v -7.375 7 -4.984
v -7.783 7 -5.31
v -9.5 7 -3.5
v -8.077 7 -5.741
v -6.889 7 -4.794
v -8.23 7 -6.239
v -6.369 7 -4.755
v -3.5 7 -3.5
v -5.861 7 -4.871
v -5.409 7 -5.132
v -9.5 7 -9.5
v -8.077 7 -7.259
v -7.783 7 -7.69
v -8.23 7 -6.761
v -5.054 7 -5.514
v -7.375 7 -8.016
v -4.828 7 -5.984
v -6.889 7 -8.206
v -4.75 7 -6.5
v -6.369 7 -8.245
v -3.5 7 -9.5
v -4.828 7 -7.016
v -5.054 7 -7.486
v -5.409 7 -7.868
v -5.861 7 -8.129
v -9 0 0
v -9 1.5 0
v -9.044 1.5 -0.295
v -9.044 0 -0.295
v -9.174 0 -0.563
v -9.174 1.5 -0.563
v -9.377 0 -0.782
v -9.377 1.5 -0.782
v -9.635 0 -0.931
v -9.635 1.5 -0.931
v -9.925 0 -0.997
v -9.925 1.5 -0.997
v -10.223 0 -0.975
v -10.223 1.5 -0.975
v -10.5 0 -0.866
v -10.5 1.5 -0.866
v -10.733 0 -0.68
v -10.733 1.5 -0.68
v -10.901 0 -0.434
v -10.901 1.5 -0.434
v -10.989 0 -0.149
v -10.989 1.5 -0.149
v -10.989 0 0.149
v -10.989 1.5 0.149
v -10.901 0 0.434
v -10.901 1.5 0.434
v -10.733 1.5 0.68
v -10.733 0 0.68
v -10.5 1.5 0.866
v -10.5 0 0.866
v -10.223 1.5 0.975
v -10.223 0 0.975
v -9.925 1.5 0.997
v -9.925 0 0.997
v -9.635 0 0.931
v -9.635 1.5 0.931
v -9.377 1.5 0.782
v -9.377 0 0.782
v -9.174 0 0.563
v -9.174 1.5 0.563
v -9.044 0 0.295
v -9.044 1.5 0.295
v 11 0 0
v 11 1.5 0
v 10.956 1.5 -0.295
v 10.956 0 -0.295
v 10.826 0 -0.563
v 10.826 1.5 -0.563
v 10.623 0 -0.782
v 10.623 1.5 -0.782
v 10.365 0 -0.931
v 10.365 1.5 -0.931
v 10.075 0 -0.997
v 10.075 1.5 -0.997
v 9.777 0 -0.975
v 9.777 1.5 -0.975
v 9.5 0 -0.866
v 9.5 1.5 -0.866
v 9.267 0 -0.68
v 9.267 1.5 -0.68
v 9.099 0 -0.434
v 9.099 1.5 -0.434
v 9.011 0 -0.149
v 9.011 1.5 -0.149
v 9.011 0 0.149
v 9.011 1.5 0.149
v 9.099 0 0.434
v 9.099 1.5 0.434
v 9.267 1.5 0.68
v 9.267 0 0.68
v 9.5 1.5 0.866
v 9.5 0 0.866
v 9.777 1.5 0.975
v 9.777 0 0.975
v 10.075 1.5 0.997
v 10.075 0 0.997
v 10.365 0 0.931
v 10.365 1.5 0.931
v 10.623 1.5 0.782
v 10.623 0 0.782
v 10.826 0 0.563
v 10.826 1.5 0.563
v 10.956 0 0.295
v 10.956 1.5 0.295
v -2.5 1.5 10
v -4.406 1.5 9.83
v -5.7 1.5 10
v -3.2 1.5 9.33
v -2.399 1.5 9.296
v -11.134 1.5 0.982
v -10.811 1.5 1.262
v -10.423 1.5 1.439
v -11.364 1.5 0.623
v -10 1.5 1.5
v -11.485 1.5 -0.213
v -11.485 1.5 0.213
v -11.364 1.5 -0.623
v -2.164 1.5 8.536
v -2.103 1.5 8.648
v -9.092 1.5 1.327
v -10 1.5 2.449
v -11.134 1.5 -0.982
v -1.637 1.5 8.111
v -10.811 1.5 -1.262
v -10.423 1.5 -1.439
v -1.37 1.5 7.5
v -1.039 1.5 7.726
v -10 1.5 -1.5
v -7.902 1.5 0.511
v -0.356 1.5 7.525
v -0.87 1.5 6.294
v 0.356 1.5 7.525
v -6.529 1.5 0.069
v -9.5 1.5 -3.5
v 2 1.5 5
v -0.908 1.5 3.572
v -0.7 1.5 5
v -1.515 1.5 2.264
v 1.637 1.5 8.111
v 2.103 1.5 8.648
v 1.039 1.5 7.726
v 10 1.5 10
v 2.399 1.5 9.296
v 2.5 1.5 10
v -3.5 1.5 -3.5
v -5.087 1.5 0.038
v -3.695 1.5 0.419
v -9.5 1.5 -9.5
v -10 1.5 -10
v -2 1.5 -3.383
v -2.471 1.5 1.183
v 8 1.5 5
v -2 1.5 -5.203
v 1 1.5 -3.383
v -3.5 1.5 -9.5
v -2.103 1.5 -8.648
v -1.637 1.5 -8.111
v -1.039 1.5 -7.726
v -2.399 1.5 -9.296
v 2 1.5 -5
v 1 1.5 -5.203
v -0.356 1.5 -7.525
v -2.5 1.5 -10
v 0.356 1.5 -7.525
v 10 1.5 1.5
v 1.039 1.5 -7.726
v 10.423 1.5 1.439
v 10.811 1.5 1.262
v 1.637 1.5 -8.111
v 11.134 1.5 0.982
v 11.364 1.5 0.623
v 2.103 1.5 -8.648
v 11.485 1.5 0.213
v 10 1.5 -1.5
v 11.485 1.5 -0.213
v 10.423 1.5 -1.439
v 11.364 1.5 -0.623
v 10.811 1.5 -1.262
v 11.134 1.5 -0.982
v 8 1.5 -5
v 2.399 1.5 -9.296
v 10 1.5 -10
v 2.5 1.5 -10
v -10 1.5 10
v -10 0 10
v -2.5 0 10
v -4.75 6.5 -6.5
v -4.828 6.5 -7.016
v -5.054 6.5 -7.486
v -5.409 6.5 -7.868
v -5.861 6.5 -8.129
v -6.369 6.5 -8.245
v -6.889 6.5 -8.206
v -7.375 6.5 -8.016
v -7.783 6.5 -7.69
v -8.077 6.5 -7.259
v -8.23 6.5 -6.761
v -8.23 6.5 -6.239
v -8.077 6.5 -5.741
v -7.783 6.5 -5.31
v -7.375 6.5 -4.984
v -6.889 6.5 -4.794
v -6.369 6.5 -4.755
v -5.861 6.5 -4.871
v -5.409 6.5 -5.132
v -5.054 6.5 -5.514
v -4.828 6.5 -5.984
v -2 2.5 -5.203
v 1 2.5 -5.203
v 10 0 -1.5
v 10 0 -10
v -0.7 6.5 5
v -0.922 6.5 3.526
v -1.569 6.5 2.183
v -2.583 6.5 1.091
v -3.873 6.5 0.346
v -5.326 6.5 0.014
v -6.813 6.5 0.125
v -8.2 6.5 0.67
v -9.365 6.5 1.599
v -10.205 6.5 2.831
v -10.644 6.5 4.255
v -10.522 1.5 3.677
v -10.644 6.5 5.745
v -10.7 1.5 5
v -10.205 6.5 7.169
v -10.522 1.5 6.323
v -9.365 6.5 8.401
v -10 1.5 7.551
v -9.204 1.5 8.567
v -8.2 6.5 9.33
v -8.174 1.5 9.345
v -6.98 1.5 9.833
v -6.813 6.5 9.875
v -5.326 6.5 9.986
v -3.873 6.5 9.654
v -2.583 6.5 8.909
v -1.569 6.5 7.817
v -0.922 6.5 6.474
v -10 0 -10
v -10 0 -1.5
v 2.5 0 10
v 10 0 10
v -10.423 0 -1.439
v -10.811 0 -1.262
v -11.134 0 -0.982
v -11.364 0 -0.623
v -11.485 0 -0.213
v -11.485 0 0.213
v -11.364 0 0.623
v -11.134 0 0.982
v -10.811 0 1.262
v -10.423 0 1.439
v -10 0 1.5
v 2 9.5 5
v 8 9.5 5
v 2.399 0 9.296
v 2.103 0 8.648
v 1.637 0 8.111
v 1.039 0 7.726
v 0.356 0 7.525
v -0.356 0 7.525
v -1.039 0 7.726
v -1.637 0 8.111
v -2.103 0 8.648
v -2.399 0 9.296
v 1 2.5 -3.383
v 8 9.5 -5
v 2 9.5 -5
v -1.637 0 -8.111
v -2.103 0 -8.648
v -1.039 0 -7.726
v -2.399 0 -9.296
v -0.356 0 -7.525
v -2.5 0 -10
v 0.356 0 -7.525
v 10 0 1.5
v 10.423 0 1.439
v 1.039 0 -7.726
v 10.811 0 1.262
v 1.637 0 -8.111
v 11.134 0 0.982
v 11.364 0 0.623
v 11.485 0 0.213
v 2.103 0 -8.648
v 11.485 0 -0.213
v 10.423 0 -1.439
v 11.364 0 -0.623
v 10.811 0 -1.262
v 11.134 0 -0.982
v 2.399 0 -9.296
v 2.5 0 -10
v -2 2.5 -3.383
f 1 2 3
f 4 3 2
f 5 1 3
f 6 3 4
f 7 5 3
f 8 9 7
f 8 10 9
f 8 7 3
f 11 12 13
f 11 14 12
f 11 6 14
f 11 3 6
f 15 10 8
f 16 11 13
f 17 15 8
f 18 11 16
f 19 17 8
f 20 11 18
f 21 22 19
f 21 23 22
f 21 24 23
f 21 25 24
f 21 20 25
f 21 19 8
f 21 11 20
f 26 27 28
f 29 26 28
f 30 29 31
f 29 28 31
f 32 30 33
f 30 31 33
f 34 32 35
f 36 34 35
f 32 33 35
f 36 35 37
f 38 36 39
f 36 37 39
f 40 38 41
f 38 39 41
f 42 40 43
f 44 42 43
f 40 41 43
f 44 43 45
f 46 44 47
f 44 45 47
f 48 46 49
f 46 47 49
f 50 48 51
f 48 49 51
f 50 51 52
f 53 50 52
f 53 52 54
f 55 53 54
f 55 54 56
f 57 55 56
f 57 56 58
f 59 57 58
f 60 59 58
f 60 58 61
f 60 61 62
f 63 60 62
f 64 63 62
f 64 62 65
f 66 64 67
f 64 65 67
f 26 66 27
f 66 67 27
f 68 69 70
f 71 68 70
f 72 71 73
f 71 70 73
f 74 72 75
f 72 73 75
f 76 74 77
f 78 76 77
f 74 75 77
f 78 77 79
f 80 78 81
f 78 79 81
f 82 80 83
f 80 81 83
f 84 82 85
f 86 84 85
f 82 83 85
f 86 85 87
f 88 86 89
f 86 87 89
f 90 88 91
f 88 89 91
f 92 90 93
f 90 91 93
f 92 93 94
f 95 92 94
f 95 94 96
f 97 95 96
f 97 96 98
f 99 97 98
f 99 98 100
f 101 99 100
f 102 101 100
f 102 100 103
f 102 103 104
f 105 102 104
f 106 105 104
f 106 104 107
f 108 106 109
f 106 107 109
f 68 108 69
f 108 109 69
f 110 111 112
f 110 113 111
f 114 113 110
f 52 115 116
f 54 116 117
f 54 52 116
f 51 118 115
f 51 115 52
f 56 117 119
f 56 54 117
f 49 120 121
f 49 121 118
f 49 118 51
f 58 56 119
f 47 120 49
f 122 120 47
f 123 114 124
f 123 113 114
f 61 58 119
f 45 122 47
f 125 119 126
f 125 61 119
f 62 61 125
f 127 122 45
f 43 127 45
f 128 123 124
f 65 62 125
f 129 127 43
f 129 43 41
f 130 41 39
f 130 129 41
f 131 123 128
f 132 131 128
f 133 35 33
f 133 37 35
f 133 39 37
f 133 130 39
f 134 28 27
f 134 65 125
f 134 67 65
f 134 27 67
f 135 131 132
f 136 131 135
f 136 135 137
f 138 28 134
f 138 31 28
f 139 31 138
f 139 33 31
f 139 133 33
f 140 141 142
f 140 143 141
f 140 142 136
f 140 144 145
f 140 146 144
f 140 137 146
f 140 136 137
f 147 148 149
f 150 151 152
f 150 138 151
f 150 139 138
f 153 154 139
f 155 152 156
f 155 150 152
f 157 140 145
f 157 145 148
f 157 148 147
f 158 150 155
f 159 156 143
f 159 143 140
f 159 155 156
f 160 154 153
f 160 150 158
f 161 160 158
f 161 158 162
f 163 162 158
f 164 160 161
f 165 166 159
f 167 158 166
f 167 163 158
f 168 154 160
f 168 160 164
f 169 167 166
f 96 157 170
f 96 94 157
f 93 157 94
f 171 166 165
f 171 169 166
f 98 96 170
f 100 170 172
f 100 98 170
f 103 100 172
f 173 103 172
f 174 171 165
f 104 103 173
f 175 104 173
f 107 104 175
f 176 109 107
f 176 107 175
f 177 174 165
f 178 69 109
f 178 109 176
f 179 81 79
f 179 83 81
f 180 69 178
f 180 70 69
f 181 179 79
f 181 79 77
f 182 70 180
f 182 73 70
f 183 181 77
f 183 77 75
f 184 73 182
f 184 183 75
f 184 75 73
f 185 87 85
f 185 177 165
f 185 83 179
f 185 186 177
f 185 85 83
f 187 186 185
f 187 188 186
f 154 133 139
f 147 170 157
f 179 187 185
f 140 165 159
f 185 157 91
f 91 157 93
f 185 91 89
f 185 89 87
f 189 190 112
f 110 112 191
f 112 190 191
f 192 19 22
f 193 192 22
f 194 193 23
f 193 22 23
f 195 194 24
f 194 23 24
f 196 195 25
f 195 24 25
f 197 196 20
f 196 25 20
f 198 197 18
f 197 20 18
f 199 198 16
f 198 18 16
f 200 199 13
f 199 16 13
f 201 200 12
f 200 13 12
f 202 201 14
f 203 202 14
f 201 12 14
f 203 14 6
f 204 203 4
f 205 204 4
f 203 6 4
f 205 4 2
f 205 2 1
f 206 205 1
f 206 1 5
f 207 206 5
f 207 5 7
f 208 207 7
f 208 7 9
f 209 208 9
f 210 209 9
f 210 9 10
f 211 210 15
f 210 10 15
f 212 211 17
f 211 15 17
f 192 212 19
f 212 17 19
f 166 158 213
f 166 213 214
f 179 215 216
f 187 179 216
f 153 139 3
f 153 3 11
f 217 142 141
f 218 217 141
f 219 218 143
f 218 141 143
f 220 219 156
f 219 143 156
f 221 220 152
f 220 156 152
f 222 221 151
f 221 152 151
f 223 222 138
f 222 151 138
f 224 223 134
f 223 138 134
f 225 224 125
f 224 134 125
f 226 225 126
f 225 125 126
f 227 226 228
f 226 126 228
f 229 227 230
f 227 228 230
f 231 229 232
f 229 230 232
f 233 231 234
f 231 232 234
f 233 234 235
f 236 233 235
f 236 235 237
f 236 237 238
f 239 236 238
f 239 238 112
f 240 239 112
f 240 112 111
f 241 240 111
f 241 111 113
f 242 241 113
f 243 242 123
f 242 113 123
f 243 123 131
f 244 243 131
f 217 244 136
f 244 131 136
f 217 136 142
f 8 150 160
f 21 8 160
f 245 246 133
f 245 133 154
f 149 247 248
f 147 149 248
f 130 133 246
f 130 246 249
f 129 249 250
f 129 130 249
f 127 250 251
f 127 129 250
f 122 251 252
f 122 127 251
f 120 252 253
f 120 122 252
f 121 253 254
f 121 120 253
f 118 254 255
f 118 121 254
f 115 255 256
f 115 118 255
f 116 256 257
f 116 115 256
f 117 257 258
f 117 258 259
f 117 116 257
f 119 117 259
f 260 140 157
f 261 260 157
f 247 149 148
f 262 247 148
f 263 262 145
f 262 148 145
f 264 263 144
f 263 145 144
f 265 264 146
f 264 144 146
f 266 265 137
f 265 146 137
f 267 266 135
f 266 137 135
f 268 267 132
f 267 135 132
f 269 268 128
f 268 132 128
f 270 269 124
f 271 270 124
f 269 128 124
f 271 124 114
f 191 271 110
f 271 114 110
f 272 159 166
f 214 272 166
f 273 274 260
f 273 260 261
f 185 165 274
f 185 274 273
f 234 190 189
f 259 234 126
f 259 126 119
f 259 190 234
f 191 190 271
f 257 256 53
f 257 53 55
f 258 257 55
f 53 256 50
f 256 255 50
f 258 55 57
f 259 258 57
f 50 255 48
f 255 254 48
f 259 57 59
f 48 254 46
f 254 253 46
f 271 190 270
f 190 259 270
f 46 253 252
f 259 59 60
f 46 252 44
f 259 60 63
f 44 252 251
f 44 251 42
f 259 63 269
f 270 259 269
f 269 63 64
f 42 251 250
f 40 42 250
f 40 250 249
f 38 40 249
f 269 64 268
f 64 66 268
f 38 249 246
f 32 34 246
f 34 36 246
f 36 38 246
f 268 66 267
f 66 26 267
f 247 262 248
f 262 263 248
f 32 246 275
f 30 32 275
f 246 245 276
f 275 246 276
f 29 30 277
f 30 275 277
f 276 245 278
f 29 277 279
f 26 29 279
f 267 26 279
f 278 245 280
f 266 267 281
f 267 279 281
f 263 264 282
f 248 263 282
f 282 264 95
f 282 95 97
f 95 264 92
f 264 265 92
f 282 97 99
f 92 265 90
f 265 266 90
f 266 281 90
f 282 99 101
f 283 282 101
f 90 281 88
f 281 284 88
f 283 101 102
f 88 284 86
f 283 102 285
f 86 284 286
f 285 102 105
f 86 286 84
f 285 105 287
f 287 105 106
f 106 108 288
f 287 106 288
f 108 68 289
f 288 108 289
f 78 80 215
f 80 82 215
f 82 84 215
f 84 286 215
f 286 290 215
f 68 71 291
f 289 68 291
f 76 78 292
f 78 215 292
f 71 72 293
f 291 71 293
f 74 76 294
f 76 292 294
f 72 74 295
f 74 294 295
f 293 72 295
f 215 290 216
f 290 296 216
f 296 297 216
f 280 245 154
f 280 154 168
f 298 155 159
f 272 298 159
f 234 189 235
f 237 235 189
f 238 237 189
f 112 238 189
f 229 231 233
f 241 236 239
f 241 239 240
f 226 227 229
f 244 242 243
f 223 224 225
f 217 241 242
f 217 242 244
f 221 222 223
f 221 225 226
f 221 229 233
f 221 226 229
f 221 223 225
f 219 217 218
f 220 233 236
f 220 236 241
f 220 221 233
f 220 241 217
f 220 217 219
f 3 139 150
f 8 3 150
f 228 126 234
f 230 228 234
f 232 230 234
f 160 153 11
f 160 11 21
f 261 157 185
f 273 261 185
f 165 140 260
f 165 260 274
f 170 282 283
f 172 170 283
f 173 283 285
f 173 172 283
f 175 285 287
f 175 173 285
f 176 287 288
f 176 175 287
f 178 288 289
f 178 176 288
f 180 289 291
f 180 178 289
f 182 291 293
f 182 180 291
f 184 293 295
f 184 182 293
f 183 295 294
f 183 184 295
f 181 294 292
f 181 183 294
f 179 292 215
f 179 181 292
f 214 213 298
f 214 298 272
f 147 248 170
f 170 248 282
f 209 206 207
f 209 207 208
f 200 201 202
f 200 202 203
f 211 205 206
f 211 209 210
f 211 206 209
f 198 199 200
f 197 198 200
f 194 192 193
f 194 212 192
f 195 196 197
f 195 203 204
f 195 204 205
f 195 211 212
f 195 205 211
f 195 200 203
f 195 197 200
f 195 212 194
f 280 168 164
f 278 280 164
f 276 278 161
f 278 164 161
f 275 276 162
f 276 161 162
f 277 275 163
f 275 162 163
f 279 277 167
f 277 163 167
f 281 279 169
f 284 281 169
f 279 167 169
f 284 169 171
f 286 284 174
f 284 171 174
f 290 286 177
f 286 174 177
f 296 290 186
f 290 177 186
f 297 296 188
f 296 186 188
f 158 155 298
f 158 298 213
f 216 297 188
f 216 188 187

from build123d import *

# Parameters (mm, degrees)
SKETCH1_W           = 20
SKETCH1_H           = 20
BOSS_EXTRUDE1_DEPTH = 1.5
SKETCH2_R           = 1.5
BOSS_EXTRUDE2_DEPTH = 1.5
SKETCH3_R           = 1
SKETCH3_R_2         = 2.5
CUT_EXTRUDE1_DEPTH  = 1.5
SKETCH4_R           = 5
BOSS_EXTRUDE3_DEPTH = 5
SKETCH5_W           = 6
SKETCH5_H           = 6
BOSS_EXTRUDE4_DEPTH = 5.5
SKETCH6_W           = 6
SKETCH6_H           = 10
BOSS_EXTRUDE5_DEPTH = 8
SKETCH7_W           = 3
SKETCH7_H           = 1.820054299
BOSS_EXTRUDE6_DEPTH = 1
SKETCH8_R           = 1.75
CUT_EXTRUDE2_DEPTH  = 0.5


with BuildPart() as part:
    # Sketch1 → Boss-Extrude1 (new body)
    with BuildSketch(Plane(origin=(0, 0, 0), x_dir=(1, 0, 0), z_dir=(0, 1, 0))):
        Rectangle(SKETCH1_W, SKETCH1_H)
    extrude(amount=BOSS_EXTRUDE1_DEPTH)

    # Sketch2 → Boss-Extrude2 (add)
    with BuildSketch(Plane(origin=(0, 1.5, 0), x_dir=(1, 0, 0), z_dir=(0, 1, 0))):
        with Locations((-10, 0)):
            Circle(SKETCH2_R)
        with Locations((10, 0)):
            Circle(SKETCH2_R)
    extrude(amount=-BOSS_EXTRUDE2_DEPTH)

    # Sketch3 → Cut-Extrude1 (cut)
    with BuildSketch(Plane(origin=(0, 1.5, 0), x_dir=(1, 0, 0), z_dir=(0, 1, 0))):
        with Locations((-10, 0)):
            Circle(SKETCH3_R)
        with Locations((10, 0)):
            Circle(SKETCH3_R)
        with Locations((0, 10)):
            Circle(SKETCH3_R_2)
        with Locations((0, -10)):
            Circle(SKETCH3_R_2)
    extrude(amount=-CUT_EXTRUDE1_DEPTH, mode=Mode.SUBTRACT)

    # Sketch4 → Boss-Extrude3 (add)
    with BuildSketch(Plane(origin=(0, 1.5, 0), x_dir=(1, 0, 0), z_dir=(0, 1, 0))):
        with Locations((-5.7, -5)):
            Circle(SKETCH4_R)
    extrude(amount=BOSS_EXTRUDE3_DEPTH)

    # Sketch5 → Boss-Extrude4 (add)
    with BuildSketch(Plane(origin=(0, 1.5, 0), x_dir=(1, 0, 0), z_dir=(0, 1, 0))):
        with Locations((-6.5, 6.5)):
            Rectangle(SKETCH5_W, SKETCH5_H)
    extrude(amount=BOSS_EXTRUDE4_DEPTH)

    # Sketch6 → Boss-Extrude5 (add)
    with BuildSketch(Plane(origin=(0, 1.5, 0), x_dir=(1, 0, 0), z_dir=(0, 1, 0))):
        with Locations((5, 0)):
            Rectangle(SKETCH6_W, SKETCH6_H)
    extrude(amount=BOSS_EXTRUDE5_DEPTH)

    # Sketch7 → Boss-Extrude6 (add)
    with BuildSketch(Plane(origin=(0, 1.5, 0), x_dir=(1, 0, 0), z_dir=(0, 1, 0))):
        with Locations((-0.5, 4.292954161)):
            Rectangle(SKETCH7_W, SKETCH7_H)
    extrude(amount=BOSS_EXTRUDE6_DEPTH)

    # Sketch8 → Cut-Extrude2 (cut)
    with BuildSketch(Plane(origin=(0, 7, 0), x_dir=(1, 0, 0), z_dir=(0, 1, 0))):
        with Locations((-6.5, 6.5)):
            Circle(SKETCH8_R)
    extrude(amount=-CUT_EXTRUDE2_DEPTH, mode=Mode.SUBTRACT)


solid = part.part
